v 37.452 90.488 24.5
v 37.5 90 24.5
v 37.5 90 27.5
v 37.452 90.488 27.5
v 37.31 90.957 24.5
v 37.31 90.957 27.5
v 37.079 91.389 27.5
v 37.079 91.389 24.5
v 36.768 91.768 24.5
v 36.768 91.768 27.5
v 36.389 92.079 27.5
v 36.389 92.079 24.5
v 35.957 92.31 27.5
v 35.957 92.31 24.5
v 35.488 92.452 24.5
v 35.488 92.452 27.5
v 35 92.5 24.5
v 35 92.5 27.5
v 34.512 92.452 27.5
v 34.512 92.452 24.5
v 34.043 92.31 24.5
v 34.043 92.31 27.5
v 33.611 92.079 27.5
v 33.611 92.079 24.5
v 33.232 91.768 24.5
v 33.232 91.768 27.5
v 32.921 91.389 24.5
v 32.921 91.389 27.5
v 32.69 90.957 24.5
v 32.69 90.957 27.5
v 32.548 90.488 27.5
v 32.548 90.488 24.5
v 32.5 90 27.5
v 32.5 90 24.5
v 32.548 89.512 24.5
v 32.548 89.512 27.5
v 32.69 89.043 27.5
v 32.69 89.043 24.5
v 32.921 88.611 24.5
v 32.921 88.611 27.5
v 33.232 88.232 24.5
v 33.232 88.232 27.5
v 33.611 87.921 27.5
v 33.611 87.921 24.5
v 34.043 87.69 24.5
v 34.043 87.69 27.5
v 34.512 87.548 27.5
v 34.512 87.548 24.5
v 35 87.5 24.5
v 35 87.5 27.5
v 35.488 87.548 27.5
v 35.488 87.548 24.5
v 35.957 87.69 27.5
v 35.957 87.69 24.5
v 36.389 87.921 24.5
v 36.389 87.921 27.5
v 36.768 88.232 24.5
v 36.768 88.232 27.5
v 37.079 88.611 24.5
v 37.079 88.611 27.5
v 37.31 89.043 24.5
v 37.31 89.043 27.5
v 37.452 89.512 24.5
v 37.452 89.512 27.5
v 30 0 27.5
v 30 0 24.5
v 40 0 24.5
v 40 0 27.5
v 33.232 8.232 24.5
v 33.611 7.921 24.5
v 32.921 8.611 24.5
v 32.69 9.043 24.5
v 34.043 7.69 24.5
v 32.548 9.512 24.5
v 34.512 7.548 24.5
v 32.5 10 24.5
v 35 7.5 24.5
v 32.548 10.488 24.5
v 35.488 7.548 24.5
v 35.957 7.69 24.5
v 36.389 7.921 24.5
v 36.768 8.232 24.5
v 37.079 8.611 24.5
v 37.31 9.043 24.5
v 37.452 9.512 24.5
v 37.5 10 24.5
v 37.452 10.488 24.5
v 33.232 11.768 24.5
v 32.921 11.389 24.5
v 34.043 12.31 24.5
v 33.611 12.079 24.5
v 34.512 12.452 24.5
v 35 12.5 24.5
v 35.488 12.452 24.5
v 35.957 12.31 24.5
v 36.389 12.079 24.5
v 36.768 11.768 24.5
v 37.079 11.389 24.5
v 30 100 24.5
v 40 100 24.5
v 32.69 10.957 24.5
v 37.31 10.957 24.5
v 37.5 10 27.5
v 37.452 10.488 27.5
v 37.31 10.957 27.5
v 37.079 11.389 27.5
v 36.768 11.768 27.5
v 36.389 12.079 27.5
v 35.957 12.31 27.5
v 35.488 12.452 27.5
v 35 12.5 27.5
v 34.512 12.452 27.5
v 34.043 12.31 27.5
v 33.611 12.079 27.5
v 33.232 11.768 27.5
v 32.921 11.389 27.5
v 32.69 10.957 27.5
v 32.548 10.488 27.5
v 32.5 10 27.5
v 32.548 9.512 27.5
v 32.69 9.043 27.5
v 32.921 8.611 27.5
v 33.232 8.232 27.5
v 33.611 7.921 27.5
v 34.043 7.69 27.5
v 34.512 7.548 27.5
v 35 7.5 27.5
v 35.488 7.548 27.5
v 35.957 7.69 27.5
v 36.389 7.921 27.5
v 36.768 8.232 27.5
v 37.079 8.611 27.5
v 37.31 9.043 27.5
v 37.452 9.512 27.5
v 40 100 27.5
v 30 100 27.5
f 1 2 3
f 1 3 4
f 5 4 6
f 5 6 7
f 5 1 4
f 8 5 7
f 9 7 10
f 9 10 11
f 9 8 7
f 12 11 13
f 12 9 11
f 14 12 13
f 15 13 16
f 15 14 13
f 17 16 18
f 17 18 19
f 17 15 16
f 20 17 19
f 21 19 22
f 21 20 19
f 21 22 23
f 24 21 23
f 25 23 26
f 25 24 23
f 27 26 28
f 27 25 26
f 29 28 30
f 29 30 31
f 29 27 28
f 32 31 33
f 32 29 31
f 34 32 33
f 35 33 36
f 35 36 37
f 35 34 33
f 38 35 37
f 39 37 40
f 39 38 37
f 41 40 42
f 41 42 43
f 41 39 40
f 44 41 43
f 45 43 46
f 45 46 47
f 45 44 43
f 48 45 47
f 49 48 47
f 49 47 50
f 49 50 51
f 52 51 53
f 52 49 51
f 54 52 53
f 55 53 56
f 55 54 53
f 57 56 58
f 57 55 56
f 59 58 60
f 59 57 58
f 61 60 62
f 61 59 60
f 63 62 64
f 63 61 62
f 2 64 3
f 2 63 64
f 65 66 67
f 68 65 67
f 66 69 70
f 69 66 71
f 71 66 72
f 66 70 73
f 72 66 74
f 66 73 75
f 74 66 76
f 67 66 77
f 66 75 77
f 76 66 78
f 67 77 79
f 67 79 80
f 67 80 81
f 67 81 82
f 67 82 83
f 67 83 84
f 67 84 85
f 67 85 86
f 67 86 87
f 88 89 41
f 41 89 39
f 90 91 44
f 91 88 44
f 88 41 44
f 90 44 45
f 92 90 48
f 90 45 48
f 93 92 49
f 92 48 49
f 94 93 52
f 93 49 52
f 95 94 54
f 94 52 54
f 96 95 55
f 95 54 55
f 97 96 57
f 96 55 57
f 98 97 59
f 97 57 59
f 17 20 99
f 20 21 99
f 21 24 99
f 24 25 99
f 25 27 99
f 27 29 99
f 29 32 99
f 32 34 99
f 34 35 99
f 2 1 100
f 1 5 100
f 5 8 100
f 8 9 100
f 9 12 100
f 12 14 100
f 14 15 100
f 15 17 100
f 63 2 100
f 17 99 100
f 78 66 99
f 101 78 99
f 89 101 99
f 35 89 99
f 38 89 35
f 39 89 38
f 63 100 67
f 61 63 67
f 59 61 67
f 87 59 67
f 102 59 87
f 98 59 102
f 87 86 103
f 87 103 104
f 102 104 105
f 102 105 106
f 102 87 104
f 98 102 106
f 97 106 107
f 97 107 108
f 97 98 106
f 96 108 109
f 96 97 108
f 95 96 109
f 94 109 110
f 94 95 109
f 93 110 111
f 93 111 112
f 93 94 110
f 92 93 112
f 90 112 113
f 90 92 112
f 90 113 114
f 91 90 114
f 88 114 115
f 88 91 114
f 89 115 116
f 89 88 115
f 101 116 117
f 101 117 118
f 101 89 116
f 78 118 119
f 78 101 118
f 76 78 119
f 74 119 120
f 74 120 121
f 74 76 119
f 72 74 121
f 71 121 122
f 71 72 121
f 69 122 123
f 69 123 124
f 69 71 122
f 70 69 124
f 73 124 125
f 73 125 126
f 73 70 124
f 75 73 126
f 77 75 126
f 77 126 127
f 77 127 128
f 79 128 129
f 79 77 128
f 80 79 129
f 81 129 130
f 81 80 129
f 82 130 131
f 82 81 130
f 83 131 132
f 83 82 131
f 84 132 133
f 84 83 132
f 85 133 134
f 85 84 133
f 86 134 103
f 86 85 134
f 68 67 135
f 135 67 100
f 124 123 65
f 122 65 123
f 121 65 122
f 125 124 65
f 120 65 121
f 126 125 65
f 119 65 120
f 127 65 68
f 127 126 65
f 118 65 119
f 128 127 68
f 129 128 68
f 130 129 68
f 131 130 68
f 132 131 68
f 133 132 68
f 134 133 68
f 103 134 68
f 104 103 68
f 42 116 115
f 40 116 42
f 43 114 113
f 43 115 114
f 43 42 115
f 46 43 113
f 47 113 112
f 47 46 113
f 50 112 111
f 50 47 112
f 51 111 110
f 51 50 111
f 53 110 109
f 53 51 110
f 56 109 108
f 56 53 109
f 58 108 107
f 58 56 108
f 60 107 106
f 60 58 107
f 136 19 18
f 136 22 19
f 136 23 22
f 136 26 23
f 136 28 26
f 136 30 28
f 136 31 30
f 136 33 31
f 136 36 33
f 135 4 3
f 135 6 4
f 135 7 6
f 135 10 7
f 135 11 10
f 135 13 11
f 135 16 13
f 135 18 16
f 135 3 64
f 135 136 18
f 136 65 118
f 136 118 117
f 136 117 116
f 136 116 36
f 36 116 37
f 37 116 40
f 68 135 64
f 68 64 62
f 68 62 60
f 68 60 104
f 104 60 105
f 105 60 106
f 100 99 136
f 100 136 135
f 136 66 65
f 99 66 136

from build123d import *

# Parameters (mm, degrees)
CYLINDER010_R     = 2.5
CYLINDER010_DEPTH = 3
CYLINDER009_R     = 2.5
CYLINDER009_DEPTH = 3
BOX002_W          = 10
BOX002_H          = 100
BOX002_DEPTH      = 3


with BuildPart() as cylinder010:
    # Cylinder010 → Cylinder010 (new body)
    with BuildSketch(Plane(origin=(35, 90, 24.5), x_dir=(1, 0, 0), z_dir=(0, 0, 1))):
        Circle(CYLINDER010_R)
    extrude(amount=CYLINDER010_DEPTH)


with BuildPart() as cylinder009:
    # Cylinder009 → Cylinder009 (new body)
    with BuildSketch(Plane(origin=(35, 10, 24.5), x_dir=(1, 0, 0), z_dir=(0, 0, 1))):
        Circle(CYLINDER009_R)
    extrude(amount=CYLINDER009_DEPTH)


with BuildPart() as cut_1st_support_bar:
    # Box002 → Box002 (new body)
    with BuildSketch(Plane(origin=(30, 0, 24.5), x_dir=(1, 0, 0), z_dir=(0, 0, 1))):
        with Locations((5, 50)):
            Rectangle(BOX002_W, BOX002_H)
    extrude(amount=BOX002_DEPTH)

    # Cut003: cut Cylinder009
    add(cylinder009.part, mode=Mode.SUBTRACT)

    # Cut004: cut Cylinder010
    add(cylinder010.part, mode=Mode.SUBTRACT)


solid = cut_1st_support_bar.part
